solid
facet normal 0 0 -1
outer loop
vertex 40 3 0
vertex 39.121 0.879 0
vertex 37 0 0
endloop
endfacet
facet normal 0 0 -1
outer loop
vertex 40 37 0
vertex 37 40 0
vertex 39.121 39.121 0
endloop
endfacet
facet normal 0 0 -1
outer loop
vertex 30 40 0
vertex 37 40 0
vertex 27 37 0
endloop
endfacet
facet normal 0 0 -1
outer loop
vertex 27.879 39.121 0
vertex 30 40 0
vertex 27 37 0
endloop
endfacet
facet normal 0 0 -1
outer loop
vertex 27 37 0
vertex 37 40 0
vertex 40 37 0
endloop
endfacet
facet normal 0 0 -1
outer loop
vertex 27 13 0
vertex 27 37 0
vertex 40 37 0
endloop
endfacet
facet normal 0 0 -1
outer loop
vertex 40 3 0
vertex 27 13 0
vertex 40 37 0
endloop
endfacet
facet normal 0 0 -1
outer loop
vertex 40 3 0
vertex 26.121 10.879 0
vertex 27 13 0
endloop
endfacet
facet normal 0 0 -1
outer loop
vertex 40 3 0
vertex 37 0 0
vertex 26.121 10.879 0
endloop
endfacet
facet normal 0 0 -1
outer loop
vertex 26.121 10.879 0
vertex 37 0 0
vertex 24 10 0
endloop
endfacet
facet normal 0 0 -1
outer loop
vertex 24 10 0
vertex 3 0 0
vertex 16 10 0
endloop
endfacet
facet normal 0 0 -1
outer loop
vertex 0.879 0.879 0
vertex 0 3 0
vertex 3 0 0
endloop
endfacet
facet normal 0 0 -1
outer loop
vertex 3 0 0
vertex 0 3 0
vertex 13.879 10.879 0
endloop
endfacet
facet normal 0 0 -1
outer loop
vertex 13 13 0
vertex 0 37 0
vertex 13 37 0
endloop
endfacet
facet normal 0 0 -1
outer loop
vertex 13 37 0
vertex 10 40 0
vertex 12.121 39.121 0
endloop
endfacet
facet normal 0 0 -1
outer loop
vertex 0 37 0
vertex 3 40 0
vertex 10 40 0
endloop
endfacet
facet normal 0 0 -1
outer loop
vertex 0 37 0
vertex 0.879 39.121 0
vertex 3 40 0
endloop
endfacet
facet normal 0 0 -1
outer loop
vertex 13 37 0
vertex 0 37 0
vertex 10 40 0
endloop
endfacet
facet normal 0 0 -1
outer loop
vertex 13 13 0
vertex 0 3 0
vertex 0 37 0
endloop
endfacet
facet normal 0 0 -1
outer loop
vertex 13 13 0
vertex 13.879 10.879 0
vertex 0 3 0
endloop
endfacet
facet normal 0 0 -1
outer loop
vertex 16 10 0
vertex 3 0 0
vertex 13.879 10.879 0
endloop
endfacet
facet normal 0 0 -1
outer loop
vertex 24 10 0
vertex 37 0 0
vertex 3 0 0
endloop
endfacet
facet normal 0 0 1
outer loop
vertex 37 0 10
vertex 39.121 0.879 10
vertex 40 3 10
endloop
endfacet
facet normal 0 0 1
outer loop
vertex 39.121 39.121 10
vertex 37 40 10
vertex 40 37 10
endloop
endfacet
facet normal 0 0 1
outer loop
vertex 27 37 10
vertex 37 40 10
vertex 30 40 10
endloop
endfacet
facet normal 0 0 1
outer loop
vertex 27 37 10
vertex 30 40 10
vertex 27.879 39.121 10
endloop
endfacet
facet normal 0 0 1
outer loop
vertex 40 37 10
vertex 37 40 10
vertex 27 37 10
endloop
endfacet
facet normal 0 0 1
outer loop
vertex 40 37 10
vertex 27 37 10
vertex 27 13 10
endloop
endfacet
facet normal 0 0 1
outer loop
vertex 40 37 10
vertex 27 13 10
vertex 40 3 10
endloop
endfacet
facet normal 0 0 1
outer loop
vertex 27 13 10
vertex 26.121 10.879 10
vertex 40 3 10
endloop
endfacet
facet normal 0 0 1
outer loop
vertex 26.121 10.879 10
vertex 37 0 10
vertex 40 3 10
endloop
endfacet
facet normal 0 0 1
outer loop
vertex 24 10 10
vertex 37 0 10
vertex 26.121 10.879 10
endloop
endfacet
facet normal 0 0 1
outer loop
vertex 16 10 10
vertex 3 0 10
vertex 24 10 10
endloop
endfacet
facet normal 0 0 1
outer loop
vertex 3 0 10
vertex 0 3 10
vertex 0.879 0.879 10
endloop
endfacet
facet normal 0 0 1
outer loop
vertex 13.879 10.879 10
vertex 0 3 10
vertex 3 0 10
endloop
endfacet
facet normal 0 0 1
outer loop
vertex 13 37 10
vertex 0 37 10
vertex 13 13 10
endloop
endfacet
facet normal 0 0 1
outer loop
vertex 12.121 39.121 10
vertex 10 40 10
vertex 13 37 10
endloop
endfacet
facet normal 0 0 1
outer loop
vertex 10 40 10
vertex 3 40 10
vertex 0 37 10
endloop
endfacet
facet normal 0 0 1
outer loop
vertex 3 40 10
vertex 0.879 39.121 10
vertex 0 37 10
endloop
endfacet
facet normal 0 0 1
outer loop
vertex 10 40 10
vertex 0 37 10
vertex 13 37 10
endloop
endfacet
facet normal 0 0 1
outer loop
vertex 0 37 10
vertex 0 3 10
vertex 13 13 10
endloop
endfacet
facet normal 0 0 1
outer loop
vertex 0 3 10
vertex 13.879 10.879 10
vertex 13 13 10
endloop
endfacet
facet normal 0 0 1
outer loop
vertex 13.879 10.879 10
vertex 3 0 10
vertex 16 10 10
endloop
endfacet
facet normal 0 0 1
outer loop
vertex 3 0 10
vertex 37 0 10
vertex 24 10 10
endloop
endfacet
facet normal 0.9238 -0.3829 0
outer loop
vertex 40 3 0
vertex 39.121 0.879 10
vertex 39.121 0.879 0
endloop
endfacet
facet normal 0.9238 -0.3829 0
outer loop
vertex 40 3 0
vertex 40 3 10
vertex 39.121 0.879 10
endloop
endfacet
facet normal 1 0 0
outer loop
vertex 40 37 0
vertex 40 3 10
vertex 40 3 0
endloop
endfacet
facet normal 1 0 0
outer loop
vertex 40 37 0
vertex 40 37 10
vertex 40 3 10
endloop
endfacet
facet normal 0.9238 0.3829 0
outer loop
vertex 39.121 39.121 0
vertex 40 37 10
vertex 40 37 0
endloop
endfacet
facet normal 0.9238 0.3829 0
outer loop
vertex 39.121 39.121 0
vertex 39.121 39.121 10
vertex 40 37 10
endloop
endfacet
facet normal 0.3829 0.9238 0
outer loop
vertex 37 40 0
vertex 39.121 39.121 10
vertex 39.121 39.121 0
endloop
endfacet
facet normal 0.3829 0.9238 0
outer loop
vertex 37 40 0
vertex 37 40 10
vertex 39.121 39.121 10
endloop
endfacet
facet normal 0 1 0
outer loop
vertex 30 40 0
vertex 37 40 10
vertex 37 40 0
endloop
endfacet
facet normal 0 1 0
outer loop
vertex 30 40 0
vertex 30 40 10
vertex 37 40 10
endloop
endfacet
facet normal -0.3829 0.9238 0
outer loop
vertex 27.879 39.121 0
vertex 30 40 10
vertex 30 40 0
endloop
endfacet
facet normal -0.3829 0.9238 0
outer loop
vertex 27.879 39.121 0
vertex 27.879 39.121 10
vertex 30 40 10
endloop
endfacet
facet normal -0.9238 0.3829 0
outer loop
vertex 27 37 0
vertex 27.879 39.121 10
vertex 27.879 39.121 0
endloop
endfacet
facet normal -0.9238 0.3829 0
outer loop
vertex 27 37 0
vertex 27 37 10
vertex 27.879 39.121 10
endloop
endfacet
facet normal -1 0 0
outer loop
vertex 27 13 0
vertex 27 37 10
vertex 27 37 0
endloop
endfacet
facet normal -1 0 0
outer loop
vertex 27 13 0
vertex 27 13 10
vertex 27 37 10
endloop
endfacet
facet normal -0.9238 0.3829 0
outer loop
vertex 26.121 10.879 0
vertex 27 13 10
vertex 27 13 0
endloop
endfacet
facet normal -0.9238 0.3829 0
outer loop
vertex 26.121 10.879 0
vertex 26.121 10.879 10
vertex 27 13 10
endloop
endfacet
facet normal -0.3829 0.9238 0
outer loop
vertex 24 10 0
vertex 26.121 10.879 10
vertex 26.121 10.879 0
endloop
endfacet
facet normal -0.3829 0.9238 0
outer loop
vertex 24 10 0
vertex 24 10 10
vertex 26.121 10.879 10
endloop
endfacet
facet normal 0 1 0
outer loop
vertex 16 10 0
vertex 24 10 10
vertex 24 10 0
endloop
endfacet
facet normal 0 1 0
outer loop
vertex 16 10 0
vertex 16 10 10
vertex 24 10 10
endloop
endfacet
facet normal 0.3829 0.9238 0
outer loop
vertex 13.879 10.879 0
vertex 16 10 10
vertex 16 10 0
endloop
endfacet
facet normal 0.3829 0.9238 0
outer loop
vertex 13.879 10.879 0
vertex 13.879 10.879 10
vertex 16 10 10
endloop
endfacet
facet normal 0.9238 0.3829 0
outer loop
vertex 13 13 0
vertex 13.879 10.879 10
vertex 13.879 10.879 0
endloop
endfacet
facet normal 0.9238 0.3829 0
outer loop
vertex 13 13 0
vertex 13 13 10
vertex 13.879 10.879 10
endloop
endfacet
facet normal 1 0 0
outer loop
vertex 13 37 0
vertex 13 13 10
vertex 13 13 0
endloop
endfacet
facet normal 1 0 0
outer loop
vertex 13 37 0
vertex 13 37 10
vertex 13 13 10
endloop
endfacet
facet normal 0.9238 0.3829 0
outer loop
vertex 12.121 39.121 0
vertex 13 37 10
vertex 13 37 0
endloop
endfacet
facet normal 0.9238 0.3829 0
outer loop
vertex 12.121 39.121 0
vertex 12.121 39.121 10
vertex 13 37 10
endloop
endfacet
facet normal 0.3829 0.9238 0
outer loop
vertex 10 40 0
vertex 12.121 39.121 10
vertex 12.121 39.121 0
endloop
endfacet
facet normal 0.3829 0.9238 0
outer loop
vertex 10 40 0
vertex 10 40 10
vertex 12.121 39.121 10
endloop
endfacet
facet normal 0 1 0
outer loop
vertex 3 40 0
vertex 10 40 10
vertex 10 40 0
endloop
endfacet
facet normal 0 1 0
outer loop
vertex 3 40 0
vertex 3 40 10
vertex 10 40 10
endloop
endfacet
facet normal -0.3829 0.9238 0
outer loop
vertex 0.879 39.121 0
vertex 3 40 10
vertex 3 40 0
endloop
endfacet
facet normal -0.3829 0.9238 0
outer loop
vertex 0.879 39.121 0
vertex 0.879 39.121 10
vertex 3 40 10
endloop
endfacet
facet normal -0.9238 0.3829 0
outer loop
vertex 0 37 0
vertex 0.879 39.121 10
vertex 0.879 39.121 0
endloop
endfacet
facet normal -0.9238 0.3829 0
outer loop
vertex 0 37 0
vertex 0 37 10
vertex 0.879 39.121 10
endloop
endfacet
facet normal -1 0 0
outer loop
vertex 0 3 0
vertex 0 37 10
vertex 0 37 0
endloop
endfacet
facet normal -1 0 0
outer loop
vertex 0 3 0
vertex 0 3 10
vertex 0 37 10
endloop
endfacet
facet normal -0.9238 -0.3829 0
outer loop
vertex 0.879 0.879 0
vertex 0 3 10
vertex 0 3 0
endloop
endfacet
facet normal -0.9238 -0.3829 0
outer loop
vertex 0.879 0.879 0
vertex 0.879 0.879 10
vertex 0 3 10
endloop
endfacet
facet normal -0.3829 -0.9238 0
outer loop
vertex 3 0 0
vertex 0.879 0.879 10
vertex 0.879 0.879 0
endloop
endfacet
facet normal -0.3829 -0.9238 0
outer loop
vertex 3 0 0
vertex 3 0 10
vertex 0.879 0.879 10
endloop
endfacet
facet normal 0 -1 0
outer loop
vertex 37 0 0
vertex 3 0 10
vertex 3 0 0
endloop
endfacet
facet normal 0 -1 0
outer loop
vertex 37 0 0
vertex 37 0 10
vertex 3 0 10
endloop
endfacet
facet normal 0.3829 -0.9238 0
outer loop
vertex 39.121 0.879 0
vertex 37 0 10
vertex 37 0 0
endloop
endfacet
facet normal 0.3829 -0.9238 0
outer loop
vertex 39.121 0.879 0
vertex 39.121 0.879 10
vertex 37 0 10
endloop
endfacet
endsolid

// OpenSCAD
$fn = 32;

// ----------------------------------------------------------------------
// Eye lug: clevis, 10 mm thick
// ----------------------------------------------------------------------

// --- parameters (mm) ---
profile_height = 10;      // extrusion height
profile_points = 24;      // points of the closed outline

profile = [[0, 3], [0.879, 0.879], [3, 0], [37, 0], [39.121, 0.879], [40, 3], [40, 37], [39.121, 39.121], [37, 40], [30, 40], [27.879, 39.121], [27, 37], [27, 13], [26.121, 10.879], [24, 10], [16, 10], [13.879, 10.879], [13, 13], [13, 37], [12.121, 39.121], [10, 40], [3, 40], [0.879, 39.121], [0, 37]];  // single closed polygon, 24 points, counter clockwise

// --- the one profile operation ---
linear_extrude(height = profile_height) polygon(points = profile);
